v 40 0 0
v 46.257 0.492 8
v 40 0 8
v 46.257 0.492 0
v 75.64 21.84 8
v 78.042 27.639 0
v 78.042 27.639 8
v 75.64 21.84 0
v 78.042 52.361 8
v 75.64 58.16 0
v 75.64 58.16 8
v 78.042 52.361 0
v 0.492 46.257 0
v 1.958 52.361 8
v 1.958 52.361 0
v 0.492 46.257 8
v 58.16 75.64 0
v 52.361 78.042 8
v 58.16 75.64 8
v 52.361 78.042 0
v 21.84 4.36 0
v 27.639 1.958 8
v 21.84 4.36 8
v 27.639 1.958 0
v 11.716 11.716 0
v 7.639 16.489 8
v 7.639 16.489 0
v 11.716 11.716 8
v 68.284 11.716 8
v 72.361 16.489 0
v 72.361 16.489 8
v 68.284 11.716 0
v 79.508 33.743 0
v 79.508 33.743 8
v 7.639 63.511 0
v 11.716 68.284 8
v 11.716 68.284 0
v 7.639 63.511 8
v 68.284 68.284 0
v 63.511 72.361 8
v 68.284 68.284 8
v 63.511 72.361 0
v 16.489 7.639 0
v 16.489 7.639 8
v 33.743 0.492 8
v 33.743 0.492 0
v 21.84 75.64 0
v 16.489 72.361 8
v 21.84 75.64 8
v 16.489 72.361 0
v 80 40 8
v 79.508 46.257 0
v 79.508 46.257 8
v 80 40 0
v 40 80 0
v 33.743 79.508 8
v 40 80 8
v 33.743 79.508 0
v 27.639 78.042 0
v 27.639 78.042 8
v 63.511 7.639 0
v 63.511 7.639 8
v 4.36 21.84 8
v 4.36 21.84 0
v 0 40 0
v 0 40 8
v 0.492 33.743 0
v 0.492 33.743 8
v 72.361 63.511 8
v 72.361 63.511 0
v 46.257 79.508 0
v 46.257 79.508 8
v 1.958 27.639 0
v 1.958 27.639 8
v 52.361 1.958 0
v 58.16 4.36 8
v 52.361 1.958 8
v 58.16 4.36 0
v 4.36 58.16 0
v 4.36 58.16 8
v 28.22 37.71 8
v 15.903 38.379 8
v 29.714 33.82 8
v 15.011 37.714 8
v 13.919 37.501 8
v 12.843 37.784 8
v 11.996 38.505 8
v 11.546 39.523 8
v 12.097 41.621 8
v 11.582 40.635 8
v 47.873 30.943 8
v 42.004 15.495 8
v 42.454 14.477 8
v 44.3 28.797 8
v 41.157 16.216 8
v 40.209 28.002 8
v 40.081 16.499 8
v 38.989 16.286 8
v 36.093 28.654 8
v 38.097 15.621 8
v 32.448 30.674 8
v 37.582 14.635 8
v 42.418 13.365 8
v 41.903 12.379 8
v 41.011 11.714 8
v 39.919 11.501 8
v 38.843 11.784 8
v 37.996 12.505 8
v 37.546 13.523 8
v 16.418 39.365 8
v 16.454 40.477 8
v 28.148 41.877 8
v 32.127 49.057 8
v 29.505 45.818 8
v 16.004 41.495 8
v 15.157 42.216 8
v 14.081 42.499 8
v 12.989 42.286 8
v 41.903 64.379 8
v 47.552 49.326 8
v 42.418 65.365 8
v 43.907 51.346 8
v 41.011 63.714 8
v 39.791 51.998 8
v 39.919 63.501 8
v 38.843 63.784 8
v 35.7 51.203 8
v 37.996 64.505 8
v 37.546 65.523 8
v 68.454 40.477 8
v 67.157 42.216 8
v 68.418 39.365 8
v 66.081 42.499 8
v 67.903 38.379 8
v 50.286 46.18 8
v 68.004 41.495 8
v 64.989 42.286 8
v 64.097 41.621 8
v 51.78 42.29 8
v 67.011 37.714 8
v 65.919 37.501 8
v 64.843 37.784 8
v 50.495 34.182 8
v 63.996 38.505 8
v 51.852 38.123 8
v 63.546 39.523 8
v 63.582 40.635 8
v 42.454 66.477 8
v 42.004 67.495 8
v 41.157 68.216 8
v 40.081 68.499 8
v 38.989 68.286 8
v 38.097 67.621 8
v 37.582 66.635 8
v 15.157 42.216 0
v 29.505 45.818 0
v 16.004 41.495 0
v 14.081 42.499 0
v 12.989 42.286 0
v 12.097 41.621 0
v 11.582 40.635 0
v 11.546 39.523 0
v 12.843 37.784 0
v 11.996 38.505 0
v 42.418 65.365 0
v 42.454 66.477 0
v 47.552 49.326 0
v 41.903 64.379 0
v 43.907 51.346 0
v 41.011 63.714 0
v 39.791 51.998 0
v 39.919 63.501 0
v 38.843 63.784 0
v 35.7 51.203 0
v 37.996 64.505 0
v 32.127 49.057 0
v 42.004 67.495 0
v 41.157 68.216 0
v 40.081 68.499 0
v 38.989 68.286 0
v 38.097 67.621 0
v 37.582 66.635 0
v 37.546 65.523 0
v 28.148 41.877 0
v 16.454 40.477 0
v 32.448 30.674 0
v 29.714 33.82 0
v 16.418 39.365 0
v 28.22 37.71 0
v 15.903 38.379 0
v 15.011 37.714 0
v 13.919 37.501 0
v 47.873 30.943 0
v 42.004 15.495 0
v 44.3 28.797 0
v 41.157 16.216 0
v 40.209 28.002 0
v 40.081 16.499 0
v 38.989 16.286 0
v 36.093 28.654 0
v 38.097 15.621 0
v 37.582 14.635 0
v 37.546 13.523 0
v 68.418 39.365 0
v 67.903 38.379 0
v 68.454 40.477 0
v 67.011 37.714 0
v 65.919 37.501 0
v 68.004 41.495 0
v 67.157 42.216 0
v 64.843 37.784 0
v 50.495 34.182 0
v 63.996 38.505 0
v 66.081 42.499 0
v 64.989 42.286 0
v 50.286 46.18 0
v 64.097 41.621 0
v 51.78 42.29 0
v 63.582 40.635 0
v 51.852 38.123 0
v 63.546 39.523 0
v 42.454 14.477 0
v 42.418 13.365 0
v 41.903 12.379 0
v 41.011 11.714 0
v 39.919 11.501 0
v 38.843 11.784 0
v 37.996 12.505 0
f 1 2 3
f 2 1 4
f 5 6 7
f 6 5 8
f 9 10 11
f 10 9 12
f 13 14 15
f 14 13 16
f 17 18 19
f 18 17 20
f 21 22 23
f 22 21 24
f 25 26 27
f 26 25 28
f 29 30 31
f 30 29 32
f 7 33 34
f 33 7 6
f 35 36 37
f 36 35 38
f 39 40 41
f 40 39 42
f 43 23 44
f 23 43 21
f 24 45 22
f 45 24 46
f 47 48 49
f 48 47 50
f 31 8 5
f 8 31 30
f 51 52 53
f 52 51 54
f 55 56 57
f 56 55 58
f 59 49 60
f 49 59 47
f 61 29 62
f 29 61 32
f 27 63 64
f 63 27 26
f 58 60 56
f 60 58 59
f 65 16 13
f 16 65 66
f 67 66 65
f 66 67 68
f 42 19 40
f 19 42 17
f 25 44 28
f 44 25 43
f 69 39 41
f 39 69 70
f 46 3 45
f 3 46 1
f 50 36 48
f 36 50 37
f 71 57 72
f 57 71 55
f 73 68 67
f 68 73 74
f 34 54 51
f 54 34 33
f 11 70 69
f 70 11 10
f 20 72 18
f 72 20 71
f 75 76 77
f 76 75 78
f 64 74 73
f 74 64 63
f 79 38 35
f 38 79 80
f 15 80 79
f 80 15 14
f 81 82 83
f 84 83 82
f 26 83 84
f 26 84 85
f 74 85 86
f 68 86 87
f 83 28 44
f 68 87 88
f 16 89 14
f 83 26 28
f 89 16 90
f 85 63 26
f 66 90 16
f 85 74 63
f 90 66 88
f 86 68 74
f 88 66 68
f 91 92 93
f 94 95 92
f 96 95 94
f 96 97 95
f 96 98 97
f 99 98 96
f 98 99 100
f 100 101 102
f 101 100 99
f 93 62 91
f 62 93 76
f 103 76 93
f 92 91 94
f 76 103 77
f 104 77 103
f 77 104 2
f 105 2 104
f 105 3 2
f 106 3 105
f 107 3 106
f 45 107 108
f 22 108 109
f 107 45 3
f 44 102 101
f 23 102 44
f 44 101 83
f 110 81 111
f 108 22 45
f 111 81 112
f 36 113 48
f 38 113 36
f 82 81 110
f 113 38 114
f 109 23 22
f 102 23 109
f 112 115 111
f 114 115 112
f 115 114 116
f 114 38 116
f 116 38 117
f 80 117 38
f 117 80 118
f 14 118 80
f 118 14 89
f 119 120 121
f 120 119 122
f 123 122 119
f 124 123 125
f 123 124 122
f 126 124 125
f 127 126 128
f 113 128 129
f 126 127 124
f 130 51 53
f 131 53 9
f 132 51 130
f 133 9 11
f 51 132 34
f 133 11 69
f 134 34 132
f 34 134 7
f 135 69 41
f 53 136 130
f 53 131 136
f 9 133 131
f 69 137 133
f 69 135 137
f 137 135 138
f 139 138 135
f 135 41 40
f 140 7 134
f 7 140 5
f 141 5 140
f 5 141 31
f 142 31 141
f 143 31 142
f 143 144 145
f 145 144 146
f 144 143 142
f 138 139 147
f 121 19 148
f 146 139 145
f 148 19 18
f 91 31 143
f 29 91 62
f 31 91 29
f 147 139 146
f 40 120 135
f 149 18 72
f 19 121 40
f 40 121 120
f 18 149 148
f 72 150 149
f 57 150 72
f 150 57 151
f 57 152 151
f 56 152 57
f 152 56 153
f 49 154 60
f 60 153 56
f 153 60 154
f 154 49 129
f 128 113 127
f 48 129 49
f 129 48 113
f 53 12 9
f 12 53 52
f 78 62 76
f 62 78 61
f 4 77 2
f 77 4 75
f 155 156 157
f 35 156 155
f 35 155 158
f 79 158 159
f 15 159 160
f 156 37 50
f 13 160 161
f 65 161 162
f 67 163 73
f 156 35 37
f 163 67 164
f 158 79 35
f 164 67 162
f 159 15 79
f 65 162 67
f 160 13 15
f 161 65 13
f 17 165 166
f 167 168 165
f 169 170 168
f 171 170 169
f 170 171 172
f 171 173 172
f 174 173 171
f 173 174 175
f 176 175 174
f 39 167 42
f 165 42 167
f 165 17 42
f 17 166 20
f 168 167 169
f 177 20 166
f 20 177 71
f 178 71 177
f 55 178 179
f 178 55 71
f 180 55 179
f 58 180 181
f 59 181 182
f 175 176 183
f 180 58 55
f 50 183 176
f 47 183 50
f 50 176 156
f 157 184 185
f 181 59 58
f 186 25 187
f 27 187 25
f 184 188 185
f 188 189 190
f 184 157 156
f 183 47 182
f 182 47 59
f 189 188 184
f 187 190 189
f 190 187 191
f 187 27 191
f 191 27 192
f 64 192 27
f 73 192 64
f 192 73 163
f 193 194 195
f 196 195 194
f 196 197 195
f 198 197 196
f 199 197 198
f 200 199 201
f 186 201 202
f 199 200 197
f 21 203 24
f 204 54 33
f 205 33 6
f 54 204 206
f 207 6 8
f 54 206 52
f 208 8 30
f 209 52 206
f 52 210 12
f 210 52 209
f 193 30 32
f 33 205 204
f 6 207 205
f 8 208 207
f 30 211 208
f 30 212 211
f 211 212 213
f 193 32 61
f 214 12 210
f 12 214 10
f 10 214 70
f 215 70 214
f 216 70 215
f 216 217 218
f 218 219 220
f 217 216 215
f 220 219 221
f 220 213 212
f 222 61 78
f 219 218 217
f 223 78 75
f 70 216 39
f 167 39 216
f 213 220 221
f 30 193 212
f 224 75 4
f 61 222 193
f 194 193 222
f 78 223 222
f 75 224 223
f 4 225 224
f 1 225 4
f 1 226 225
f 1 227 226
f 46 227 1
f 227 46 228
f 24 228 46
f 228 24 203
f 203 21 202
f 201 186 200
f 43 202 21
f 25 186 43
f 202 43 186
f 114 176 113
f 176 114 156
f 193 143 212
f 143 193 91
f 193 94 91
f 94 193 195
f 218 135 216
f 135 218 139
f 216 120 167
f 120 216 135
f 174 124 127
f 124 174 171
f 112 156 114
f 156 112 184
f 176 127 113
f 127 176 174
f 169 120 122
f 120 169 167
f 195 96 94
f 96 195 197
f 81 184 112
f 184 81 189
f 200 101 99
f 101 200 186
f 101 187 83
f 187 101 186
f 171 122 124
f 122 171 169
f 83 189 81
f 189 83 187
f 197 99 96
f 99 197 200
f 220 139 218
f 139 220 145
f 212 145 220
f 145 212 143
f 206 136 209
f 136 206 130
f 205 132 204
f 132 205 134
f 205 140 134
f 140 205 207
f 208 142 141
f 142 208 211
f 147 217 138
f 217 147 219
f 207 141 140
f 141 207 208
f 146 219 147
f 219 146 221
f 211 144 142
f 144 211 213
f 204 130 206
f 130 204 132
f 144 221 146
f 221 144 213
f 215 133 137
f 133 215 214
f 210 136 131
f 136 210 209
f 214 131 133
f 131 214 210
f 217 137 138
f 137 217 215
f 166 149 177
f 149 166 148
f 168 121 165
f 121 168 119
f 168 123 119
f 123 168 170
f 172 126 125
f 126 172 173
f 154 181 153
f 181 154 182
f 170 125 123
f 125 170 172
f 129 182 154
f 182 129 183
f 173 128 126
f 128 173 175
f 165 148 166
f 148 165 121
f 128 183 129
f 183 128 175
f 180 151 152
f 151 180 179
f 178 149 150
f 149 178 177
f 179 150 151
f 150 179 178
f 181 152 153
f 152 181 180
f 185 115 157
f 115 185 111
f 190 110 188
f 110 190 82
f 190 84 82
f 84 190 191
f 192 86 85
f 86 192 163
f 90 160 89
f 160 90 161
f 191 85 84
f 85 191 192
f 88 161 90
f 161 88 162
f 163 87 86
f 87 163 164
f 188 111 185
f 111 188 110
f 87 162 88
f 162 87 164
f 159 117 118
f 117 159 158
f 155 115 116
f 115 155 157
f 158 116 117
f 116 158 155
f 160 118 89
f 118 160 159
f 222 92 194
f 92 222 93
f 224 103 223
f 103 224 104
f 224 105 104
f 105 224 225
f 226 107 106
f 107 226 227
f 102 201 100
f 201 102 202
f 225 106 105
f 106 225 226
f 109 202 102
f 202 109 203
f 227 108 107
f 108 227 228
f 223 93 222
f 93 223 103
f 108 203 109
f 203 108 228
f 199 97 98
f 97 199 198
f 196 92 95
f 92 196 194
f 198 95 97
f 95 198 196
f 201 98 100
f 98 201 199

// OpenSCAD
$fn = 32;

// ----------------------------------------------------------------------
// Spacer plate: round flange R40, 4 bolts
// ----------------------------------------------------------------------

// --- parameters (mm) ---
bore_r = 12;              // centre bore radius
bolt_r = 2.5;             // bolt hole radius
plate_t = 8;              // plate thickness, Z (extrusion height)
flange_r = 40;            // flange radius
n_bolt = 4;               // bolt hole count
ring_r = 26;              // bolt circle radius

profile = [[80, 40], [79.508, 46.257], [78.042, 52.361], [75.64, 58.16], [72.361, 63.511], [68.284, 68.284], [63.511, 72.361], [58.16, 75.64], [52.361, 78.042], [46.257, 79.508], [40, 80], [33.743, 79.508], [27.639, 78.042], [21.84, 75.64], [16.489, 72.361], [11.716, 68.284], [7.639, 63.511], [4.36, 58.16], [1.958, 52.361], [0.492, 46.257], [0, 40], [0.492, 33.743], [1.958, 27.639], [4.36, 21.84], [7.639, 16.489], [11.716, 11.716], [16.489, 7.639], [21.84, 4.36], [27.639, 1.958], [33.743, 0.492], [40, 0], [46.257, 0.492], [52.361, 1.958], [58.16, 4.36], [63.511, 7.639], [68.284, 11.716], [72.361, 16.489], [75.64, 21.84], [78.042, 27.639], [79.508, 33.743]];  // primary outline, 40 points, counter clockwise
void_1 = [[51.78, 42.29], [50.286, 46.18], [47.552, 49.326], [43.907, 51.346], [39.791, 51.998], [35.7, 51.203], [32.127, 49.057], [29.505, 45.818], [28.148, 41.877], [28.22, 37.71], [29.714, 33.82], [32.448, 30.674], [36.093, 28.654], [40.209, 28.002], [44.3, 28.797], [47.873, 30.943], [50.495, 34.182], [51.852, 38.123]];  // centre bore, 18 points
void_2 = [[68.454, 40.477], [68.004, 41.495], [67.157, 42.216], [66.081, 42.499], [64.989, 42.286], [64.097, 41.621], [63.582, 40.635], [63.546, 39.523], [63.996, 38.505], [64.843, 37.784], [65.919, 37.501], [67.011, 37.714], [67.903, 38.379], [68.418, 39.365]];  // bolt hole 1, 14 points
void_3 = [[42.454, 66.477], [42.004, 67.495], [41.157, 68.216], [40.081, 68.499], [38.989, 68.286], [38.097, 67.621], [37.582, 66.635], [37.546, 65.523], [37.996, 64.505], [38.843, 63.784], [39.919, 63.501], [41.011, 63.714], [41.903, 64.379], [42.418, 65.365]];  // bolt hole 2, 14 points
void_4 = [[16.454, 40.477], [16.004, 41.495], [15.157, 42.216], [14.081, 42.499], [12.989, 42.286], [12.097, 41.621], [11.582, 40.635], [11.546, 39.523], [11.996, 38.505], [12.843, 37.784], [13.919, 37.501], [15.011, 37.714], [15.903, 38.379], [16.418, 39.365]];  // bolt hole 3, 14 points
void_5 = [[42.454, 14.477], [42.004, 15.495], [41.157, 16.216], [40.081, 16.499], [38.989, 16.286], [38.097, 15.621], [37.582, 14.635], [37.546, 13.523], [37.996, 12.505], [38.843, 11.784], [39.919, 11.501], [41.011, 11.714], [41.903, 12.379], [42.418, 13.365]];  // bolt hole 4, 14 points

// --- the one profile operation ---
difference() {
  linear_extrude(height = plate_t) polygon(points = profile);
  translate([0, 0, -1])
    linear_extrude(height = plate_t + 2) polygon(points = void_1);
  translate([0, 0, -1])
    linear_extrude(height = plate_t + 2) polygon(points = void_2);
  translate([0, 0, -1])
    linear_extrude(height = plate_t + 2) polygon(points = void_3);
  translate([0, 0, -1])
    linear_extrude(height = plate_t + 2) polygon(points = void_4);
  translate([0, 0, -1])
    linear_extrude(height = plate_t + 2) polygon(points = void_5);
}
